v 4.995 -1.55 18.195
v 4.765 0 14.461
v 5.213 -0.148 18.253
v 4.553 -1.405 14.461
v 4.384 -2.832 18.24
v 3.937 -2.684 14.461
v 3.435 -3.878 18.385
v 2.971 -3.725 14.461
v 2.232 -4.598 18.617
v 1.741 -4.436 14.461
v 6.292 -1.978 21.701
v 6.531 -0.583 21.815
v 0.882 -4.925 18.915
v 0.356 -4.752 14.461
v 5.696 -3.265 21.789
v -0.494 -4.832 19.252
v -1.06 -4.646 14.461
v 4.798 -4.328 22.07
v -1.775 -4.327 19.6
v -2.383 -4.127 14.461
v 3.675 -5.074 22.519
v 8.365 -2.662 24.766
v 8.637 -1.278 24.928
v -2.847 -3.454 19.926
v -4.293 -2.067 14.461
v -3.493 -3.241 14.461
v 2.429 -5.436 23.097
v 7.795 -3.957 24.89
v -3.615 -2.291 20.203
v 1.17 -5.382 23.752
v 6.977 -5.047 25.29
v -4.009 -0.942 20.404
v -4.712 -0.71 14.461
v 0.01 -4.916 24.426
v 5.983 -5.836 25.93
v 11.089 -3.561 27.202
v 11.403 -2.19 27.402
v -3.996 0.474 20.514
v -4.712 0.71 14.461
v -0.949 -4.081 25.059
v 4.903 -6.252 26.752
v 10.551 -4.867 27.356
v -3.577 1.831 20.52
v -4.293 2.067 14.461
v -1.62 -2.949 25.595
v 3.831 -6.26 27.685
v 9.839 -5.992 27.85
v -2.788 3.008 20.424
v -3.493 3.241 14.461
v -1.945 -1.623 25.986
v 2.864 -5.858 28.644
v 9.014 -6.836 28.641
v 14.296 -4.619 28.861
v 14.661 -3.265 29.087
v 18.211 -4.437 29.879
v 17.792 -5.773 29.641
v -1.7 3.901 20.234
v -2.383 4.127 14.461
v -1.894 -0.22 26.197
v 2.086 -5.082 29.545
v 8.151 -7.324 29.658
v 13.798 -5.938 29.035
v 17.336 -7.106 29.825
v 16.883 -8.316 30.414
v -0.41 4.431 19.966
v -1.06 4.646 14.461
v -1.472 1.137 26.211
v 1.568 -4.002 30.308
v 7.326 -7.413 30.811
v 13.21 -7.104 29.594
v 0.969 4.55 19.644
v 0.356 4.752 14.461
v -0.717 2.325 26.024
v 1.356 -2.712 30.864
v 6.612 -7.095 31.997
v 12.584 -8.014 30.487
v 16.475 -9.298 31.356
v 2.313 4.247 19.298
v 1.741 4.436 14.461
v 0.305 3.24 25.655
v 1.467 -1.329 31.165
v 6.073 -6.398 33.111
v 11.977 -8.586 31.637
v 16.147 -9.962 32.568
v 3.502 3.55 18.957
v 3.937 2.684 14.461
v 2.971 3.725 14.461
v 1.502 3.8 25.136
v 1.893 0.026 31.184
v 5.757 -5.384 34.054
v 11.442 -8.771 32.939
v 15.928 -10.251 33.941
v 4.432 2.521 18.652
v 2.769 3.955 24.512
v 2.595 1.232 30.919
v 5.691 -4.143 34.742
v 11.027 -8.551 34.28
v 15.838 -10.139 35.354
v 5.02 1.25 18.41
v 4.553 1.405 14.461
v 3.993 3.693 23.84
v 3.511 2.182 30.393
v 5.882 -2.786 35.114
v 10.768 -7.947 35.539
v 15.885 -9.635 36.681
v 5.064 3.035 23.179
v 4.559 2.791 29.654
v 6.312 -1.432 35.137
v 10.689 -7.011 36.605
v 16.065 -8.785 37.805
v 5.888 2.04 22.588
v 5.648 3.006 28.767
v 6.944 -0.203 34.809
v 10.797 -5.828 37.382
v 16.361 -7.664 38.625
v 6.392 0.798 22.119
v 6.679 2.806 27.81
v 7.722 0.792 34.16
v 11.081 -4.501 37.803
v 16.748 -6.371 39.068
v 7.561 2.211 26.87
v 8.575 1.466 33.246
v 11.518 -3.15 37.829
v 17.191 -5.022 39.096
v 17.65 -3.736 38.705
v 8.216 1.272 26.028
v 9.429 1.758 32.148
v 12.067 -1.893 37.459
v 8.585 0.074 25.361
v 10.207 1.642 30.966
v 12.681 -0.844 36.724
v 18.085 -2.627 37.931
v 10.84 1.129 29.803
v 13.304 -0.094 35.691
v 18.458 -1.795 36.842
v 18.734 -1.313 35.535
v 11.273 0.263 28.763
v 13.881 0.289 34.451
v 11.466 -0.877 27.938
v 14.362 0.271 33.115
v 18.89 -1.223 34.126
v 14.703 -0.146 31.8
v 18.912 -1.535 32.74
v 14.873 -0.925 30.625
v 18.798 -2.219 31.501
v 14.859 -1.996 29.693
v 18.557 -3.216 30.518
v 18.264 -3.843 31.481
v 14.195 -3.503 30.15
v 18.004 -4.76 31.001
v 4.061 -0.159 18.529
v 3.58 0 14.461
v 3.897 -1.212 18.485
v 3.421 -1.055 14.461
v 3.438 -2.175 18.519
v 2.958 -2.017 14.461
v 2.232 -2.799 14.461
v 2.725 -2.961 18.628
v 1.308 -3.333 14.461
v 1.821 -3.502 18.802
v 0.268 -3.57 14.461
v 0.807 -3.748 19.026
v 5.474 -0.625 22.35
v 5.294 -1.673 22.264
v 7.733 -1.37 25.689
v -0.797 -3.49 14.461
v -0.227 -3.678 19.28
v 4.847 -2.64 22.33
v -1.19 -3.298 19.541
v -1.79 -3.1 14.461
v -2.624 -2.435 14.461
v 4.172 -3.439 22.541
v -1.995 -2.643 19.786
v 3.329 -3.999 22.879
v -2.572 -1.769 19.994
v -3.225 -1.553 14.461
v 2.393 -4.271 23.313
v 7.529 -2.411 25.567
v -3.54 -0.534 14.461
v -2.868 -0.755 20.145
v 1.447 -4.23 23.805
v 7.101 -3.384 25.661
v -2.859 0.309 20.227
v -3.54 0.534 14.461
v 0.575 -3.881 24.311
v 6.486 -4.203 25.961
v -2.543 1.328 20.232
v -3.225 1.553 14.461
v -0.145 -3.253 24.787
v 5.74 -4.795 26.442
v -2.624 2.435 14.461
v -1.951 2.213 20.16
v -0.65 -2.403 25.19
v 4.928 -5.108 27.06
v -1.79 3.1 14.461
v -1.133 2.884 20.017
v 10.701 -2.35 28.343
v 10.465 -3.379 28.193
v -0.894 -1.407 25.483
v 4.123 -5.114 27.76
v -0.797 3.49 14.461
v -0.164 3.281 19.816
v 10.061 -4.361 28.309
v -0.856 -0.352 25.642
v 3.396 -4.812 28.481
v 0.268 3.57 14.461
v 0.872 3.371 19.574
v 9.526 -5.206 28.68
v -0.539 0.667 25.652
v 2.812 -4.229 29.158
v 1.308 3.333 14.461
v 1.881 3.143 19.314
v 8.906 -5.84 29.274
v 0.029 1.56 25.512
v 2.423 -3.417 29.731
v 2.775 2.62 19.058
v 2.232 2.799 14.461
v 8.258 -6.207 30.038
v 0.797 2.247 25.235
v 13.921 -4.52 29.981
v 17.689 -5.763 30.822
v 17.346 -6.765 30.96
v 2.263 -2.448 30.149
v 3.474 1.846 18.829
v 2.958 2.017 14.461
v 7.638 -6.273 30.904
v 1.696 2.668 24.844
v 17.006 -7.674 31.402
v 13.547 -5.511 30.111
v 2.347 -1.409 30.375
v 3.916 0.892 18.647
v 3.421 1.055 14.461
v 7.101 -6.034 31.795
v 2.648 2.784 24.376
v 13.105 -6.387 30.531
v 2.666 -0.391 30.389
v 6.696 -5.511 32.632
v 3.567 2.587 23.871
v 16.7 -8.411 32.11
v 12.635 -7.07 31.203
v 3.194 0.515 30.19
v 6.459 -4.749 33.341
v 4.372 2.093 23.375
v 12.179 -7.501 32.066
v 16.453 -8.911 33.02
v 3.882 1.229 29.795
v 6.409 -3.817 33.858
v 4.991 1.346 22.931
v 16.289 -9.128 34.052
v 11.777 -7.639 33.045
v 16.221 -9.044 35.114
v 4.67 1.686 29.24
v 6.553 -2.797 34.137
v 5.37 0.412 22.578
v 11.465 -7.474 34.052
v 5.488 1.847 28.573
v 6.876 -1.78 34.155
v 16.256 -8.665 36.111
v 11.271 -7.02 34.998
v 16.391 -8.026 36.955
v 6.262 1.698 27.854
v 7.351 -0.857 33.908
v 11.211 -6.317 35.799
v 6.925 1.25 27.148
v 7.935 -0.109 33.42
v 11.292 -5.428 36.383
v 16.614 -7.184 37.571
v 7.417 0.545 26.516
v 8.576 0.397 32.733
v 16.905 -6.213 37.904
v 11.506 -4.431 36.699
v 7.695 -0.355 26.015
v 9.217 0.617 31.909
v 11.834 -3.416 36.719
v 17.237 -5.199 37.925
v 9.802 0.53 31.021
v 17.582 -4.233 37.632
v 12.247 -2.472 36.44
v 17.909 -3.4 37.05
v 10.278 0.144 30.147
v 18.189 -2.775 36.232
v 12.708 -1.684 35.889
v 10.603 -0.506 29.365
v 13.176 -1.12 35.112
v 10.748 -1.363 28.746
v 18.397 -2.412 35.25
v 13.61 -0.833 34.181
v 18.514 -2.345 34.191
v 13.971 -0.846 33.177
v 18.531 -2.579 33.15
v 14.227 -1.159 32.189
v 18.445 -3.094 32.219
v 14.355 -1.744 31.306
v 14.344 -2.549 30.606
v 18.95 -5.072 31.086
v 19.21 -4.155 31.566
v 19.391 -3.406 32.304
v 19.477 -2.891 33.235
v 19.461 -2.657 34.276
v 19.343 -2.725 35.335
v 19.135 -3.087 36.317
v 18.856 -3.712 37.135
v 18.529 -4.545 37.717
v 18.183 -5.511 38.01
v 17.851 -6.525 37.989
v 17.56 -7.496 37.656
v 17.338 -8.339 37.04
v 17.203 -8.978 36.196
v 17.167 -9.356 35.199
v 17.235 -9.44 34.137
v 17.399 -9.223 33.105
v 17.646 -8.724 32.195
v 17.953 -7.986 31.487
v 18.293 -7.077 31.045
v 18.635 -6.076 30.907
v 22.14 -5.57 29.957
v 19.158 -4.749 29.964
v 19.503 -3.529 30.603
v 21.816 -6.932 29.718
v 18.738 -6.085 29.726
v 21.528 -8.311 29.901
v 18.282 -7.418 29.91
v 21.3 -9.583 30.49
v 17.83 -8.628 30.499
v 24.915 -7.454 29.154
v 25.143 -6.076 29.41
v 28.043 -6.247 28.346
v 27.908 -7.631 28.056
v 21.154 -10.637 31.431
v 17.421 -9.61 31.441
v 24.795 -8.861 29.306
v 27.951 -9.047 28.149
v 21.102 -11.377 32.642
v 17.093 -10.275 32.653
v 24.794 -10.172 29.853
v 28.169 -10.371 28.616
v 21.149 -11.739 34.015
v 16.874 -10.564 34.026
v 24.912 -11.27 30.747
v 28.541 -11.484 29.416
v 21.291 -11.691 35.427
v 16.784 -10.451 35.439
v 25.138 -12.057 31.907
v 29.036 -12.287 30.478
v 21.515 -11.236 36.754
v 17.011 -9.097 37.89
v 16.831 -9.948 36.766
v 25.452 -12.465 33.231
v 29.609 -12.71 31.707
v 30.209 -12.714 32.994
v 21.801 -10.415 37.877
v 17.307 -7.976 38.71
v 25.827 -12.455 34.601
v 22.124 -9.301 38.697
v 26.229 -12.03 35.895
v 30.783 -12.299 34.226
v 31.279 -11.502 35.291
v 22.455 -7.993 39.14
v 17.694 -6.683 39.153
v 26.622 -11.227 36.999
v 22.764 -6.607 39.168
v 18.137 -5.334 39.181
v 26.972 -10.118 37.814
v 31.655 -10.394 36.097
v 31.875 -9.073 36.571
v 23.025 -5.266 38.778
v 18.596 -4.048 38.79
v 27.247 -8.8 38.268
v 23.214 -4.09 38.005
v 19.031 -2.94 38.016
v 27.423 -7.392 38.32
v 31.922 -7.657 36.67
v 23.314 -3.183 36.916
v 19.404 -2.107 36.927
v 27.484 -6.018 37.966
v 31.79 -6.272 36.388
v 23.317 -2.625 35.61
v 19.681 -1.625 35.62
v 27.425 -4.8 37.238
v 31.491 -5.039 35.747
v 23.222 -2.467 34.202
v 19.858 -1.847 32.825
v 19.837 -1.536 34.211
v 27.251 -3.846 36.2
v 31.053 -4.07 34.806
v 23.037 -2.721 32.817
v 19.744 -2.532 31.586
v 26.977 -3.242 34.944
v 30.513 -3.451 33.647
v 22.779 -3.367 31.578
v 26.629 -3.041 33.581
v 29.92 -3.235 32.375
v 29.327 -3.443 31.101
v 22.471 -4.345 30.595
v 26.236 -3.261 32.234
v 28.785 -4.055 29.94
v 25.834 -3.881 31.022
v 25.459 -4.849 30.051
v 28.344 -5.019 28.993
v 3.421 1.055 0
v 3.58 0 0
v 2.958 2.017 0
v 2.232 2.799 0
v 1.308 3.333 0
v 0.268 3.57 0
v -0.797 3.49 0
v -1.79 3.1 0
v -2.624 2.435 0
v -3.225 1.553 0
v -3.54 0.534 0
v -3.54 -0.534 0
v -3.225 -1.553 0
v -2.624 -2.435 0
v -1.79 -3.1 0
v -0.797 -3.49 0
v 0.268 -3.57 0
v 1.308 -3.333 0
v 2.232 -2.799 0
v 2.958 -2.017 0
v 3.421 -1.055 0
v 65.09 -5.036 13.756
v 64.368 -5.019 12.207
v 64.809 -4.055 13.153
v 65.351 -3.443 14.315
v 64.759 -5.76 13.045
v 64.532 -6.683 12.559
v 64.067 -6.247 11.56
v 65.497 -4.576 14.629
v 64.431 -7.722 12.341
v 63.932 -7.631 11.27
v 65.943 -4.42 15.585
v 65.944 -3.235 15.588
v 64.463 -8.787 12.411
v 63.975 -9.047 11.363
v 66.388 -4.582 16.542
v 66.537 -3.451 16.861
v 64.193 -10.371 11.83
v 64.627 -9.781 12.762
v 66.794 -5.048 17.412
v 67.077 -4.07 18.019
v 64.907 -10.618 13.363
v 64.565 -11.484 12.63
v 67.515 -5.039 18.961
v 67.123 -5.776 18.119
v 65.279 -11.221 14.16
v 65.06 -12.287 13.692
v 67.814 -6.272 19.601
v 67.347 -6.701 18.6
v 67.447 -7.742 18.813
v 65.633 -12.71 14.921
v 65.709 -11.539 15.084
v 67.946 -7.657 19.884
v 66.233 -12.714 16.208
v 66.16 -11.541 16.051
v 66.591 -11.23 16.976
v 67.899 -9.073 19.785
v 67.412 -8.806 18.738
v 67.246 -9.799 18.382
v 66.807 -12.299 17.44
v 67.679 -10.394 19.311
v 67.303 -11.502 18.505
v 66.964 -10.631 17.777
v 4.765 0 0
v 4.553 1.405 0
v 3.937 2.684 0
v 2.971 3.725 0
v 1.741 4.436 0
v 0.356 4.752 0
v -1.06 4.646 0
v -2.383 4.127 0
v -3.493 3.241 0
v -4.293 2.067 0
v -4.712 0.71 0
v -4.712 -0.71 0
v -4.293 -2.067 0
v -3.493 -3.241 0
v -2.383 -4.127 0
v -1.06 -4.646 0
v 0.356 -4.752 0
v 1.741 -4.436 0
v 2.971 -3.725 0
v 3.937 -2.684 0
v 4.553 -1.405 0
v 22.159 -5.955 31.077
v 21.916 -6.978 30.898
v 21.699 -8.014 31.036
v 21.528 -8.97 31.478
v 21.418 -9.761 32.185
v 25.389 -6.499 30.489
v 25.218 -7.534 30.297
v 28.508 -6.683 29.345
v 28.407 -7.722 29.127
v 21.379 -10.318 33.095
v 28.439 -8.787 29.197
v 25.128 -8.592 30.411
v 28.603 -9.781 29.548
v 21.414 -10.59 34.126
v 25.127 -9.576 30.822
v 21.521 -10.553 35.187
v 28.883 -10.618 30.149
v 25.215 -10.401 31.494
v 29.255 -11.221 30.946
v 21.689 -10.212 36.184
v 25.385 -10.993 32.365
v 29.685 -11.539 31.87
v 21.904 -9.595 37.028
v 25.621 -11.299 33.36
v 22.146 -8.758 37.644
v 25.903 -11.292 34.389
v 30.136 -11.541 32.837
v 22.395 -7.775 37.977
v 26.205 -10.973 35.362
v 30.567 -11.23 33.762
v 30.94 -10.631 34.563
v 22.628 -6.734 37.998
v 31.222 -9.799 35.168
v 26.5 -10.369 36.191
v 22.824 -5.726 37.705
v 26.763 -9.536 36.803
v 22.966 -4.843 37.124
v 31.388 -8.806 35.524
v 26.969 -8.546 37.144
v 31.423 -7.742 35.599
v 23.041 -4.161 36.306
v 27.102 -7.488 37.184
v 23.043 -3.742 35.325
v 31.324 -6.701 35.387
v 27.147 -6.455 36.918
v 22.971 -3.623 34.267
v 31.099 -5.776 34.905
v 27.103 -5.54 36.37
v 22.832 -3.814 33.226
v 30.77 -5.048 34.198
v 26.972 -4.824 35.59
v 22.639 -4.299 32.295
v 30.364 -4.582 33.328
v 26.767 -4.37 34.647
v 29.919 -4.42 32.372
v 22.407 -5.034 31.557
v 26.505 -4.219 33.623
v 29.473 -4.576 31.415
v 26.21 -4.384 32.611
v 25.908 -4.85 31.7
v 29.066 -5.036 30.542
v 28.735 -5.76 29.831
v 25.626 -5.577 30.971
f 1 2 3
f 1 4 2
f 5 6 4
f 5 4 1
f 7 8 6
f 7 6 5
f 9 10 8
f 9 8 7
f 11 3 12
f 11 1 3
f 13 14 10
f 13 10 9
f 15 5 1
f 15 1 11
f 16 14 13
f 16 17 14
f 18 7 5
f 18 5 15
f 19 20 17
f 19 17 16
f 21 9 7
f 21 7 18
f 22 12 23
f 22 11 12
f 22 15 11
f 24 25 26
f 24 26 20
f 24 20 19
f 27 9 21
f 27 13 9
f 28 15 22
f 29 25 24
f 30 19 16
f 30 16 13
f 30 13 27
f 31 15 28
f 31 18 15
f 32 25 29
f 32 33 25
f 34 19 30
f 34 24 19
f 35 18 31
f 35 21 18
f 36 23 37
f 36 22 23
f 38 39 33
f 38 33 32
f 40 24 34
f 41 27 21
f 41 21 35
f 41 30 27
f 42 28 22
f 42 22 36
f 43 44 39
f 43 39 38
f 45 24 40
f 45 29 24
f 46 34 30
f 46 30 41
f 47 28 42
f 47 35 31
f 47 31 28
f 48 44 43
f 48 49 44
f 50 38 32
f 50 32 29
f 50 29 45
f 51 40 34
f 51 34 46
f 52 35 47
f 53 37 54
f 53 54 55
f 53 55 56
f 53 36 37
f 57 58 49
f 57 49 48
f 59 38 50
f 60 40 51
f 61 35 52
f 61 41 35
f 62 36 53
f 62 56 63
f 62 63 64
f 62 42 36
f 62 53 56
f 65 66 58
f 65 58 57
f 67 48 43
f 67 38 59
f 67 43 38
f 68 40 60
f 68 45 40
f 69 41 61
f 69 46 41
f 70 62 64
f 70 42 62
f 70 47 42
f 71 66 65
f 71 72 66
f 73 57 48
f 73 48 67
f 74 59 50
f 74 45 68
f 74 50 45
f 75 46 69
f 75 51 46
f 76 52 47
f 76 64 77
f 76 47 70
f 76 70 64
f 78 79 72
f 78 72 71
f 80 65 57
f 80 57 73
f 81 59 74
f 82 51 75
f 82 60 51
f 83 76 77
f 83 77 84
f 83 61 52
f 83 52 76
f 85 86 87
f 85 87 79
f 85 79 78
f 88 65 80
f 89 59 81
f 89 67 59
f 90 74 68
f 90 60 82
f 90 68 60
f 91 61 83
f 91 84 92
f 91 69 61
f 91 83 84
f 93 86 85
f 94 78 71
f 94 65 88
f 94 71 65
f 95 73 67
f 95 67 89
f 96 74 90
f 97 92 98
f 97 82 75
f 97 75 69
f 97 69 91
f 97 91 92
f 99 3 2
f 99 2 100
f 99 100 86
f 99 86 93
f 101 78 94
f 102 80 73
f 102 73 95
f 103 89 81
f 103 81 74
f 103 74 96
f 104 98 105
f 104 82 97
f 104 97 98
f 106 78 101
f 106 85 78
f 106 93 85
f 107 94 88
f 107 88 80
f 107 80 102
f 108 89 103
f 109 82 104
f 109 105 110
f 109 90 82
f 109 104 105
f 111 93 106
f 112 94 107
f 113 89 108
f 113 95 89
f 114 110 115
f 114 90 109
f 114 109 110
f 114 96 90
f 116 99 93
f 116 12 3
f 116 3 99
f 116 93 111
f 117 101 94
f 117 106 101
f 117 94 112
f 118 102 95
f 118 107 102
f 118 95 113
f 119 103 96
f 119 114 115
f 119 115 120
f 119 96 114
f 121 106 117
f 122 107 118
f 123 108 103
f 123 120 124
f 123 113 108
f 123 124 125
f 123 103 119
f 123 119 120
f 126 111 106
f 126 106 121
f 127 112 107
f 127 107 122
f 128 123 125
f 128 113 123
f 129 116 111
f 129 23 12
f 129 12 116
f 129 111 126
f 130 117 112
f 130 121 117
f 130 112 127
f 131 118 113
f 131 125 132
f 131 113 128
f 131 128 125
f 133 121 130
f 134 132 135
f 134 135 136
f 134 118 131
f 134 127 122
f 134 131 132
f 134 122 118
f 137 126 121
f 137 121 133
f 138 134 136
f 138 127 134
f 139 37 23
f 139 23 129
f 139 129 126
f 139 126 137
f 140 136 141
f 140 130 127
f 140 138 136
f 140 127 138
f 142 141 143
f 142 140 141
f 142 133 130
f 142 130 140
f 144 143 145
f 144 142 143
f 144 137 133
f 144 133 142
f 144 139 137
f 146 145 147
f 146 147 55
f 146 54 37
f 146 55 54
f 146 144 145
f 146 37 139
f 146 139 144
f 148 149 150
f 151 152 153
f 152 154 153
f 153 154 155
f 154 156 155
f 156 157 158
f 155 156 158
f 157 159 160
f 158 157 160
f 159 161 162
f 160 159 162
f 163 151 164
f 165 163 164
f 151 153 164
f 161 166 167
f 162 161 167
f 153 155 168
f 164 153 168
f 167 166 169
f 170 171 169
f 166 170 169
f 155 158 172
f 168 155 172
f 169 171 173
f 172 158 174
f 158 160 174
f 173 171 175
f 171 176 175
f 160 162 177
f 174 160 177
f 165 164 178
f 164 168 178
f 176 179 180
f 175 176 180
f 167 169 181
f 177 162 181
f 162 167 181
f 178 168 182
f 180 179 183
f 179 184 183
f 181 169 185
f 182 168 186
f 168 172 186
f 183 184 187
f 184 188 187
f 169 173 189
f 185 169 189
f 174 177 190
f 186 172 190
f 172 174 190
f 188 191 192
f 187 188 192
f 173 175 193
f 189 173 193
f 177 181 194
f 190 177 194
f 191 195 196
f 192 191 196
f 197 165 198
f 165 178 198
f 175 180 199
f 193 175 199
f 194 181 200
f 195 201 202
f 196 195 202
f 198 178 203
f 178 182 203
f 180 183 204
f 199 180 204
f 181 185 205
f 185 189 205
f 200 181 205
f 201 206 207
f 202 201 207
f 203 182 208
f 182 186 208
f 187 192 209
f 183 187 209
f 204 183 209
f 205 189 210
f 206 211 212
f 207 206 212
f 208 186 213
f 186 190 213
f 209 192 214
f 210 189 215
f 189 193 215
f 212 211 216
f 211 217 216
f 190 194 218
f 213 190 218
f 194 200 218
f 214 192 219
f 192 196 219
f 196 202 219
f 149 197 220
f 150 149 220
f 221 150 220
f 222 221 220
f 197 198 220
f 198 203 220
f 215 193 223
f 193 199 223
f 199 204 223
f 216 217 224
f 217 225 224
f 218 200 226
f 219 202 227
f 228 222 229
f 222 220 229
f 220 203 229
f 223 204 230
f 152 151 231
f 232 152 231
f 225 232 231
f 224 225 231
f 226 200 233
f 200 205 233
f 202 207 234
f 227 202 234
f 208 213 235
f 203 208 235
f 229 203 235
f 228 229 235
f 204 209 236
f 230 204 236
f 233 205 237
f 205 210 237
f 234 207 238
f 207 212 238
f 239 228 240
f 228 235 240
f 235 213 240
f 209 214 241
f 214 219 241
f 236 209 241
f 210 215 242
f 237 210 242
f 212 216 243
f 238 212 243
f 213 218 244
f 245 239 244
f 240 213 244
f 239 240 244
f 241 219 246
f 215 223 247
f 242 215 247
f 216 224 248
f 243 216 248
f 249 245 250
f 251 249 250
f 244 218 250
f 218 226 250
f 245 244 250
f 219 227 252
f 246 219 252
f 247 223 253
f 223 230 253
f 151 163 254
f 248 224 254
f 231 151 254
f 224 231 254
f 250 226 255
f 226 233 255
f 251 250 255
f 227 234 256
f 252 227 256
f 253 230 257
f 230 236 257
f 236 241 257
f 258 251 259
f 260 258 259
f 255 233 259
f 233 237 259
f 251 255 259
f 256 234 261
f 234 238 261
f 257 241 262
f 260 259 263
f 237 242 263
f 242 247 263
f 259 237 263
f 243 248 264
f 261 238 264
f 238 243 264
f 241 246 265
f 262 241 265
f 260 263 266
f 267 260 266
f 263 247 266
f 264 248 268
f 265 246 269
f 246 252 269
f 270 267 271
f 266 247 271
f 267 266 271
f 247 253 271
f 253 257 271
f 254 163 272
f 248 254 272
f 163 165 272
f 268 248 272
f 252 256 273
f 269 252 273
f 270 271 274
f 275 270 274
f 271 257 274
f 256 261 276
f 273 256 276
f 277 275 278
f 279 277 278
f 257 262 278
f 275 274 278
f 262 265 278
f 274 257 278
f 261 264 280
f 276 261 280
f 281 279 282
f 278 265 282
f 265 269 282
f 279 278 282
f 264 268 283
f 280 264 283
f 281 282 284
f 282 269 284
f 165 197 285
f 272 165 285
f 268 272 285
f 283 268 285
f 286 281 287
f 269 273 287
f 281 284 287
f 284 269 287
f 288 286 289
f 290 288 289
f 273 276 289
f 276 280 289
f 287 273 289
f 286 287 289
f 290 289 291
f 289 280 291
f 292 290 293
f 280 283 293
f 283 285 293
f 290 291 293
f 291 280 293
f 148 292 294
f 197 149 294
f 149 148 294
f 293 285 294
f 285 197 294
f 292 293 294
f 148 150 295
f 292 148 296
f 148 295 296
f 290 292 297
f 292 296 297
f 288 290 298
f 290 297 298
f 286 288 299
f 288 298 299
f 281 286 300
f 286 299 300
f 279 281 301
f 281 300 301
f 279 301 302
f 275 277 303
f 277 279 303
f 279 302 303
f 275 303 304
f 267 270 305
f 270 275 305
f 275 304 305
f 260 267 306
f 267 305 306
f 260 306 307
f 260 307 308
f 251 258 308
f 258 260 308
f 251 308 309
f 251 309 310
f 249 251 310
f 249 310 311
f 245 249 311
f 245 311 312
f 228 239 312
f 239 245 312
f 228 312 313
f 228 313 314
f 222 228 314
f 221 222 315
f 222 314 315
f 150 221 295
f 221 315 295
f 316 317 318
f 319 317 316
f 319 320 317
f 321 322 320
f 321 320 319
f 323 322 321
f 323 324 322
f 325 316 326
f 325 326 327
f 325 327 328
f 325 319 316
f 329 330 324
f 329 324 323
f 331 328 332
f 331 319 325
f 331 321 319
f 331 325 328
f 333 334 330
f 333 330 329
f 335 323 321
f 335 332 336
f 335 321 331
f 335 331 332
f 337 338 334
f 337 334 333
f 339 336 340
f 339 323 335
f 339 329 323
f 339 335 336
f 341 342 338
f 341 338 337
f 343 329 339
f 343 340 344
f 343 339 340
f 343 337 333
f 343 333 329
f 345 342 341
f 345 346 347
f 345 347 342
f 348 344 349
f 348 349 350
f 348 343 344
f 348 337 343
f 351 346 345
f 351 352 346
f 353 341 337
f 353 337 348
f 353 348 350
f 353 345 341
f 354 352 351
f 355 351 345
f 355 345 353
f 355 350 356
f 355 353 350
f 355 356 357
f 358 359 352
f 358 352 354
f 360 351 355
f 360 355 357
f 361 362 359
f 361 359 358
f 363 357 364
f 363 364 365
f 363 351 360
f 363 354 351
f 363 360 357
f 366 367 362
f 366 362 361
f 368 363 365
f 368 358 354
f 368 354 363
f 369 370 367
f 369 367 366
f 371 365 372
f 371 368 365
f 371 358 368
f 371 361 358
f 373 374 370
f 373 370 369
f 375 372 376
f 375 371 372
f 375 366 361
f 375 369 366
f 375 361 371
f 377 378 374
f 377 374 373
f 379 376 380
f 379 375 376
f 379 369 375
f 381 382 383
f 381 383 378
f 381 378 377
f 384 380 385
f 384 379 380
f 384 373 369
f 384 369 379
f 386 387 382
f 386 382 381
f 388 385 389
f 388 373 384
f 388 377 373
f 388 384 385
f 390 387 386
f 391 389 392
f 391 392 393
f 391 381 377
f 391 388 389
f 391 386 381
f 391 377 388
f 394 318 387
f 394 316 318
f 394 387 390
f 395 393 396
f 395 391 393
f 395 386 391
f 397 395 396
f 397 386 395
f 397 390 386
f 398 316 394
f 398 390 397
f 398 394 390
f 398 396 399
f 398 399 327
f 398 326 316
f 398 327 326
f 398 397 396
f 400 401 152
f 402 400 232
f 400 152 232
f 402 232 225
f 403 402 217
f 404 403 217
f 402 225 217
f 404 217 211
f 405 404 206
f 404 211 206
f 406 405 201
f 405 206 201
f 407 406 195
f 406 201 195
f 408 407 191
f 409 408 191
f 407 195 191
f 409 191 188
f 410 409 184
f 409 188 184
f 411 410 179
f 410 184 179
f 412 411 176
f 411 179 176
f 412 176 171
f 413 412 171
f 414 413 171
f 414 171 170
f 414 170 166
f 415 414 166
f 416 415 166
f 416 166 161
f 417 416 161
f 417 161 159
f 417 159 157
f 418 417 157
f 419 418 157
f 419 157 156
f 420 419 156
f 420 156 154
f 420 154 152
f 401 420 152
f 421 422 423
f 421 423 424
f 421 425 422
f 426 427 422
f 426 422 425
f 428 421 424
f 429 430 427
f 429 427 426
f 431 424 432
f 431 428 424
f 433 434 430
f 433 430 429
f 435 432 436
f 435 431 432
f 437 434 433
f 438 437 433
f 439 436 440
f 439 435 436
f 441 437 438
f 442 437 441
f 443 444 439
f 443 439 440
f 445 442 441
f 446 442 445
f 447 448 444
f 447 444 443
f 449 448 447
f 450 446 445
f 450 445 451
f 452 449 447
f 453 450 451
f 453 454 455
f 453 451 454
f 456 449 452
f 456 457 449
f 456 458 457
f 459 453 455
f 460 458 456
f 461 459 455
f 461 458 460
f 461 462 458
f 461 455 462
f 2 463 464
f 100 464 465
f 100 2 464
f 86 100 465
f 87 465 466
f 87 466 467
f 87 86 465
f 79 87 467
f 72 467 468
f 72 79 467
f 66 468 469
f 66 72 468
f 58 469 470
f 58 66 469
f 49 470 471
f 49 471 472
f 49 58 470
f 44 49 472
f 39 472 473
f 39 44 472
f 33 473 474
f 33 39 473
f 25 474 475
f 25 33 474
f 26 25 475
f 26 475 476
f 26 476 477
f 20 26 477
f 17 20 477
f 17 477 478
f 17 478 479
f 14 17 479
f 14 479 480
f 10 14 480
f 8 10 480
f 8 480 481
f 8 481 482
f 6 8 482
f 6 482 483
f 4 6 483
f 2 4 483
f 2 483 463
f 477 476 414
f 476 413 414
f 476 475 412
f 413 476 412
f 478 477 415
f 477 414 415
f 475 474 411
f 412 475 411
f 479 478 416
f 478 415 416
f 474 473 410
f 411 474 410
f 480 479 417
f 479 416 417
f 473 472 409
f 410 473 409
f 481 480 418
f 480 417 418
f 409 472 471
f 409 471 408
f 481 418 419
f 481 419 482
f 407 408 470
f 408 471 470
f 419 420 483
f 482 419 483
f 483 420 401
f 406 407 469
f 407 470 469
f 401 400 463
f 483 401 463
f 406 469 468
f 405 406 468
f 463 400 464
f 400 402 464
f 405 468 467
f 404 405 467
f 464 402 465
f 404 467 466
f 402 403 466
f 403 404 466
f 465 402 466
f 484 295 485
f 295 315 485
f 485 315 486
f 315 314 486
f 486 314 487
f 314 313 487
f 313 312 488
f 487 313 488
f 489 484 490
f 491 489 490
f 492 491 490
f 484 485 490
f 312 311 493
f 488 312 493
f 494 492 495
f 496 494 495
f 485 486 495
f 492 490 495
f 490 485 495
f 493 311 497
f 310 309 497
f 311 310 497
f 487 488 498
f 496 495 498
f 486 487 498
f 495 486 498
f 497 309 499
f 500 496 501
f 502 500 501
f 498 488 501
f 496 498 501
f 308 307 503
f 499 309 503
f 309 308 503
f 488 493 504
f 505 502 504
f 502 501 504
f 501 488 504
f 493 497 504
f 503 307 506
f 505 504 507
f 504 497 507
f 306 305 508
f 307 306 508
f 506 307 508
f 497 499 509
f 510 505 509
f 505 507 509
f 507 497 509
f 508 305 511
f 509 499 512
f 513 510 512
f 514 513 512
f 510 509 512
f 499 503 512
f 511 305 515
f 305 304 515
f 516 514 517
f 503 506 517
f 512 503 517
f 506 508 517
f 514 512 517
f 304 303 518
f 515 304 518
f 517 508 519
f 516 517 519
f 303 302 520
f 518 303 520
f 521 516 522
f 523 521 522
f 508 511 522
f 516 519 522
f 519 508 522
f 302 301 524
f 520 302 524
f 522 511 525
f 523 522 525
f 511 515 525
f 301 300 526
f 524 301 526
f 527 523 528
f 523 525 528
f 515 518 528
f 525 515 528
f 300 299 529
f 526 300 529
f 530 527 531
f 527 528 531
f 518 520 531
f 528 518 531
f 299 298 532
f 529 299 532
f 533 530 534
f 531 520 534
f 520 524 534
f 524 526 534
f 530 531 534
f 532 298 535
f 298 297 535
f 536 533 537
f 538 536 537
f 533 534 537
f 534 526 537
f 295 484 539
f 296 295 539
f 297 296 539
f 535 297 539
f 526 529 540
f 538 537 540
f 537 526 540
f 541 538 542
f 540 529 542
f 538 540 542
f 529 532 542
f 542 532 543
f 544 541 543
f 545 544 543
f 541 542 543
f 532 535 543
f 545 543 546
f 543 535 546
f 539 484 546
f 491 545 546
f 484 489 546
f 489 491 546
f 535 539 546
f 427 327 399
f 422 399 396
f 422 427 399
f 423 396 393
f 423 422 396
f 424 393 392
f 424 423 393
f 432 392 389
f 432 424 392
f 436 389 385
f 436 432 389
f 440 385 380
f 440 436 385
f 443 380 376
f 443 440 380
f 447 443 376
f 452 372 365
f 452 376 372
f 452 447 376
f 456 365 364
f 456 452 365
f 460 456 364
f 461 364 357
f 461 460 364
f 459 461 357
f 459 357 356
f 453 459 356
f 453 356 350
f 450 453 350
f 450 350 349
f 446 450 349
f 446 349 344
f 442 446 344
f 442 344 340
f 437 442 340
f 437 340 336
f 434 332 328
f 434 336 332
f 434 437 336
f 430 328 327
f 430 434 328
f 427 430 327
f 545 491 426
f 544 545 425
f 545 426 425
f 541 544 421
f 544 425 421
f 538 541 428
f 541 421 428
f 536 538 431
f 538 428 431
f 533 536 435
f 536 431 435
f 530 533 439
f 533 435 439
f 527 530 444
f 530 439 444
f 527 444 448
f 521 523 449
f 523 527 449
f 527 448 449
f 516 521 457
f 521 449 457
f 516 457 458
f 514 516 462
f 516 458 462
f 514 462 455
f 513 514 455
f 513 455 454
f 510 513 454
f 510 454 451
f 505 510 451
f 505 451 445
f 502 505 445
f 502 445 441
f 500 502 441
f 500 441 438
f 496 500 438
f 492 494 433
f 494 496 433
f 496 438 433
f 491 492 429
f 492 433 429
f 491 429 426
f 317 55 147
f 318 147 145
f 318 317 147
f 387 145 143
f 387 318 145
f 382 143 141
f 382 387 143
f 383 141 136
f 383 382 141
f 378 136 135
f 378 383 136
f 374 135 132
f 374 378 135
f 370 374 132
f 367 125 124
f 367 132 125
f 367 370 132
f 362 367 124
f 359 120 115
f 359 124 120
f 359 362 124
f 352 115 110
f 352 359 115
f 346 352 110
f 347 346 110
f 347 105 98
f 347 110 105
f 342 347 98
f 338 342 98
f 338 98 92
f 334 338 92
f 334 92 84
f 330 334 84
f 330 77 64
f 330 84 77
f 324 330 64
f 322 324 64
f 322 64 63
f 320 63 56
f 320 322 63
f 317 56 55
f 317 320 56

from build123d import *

# Parameters (mm, degrees)
SKETCH_1_R   = 4.765
SKETCH_1_R_2 = 3.58


with BuildPart() as part:
    # По траектории1: sweep along a curve in space
    with BuildLine() as sweep_1_path:
        Line((0, 0, 0), (0, 0, 14.460504946))
        ThreePointArc((17.378248064, -5.734487139, 34.388118956), (5.003679185, -1.651117755, 27.988232477), (0, 0, 14.460504946))
        Line((18.324445146, -6.046713952, 34.473121895), (17.378248064, -5.734487139, 34.388118956))
        ThreePointArc((29.914415781, -8, 32.362570038), (24.180183472, -7.500284638, 34.192857359), (18.324445146, -6.046713952, 34.473121895))
        Line((29.914415781, -8, 32.362570038), (65.938376067, -8, 15.576419335))
    # Эскиз1 → По траектории1 (sweep)
    with BuildSketch(Plane.XY):
        Circle(SKETCH_1_R)
        Circle(SKETCH_1_R_2, mode=Mode.SUBTRACT)
    sweep(path=sweep_1_path.line)


solid = part.part
